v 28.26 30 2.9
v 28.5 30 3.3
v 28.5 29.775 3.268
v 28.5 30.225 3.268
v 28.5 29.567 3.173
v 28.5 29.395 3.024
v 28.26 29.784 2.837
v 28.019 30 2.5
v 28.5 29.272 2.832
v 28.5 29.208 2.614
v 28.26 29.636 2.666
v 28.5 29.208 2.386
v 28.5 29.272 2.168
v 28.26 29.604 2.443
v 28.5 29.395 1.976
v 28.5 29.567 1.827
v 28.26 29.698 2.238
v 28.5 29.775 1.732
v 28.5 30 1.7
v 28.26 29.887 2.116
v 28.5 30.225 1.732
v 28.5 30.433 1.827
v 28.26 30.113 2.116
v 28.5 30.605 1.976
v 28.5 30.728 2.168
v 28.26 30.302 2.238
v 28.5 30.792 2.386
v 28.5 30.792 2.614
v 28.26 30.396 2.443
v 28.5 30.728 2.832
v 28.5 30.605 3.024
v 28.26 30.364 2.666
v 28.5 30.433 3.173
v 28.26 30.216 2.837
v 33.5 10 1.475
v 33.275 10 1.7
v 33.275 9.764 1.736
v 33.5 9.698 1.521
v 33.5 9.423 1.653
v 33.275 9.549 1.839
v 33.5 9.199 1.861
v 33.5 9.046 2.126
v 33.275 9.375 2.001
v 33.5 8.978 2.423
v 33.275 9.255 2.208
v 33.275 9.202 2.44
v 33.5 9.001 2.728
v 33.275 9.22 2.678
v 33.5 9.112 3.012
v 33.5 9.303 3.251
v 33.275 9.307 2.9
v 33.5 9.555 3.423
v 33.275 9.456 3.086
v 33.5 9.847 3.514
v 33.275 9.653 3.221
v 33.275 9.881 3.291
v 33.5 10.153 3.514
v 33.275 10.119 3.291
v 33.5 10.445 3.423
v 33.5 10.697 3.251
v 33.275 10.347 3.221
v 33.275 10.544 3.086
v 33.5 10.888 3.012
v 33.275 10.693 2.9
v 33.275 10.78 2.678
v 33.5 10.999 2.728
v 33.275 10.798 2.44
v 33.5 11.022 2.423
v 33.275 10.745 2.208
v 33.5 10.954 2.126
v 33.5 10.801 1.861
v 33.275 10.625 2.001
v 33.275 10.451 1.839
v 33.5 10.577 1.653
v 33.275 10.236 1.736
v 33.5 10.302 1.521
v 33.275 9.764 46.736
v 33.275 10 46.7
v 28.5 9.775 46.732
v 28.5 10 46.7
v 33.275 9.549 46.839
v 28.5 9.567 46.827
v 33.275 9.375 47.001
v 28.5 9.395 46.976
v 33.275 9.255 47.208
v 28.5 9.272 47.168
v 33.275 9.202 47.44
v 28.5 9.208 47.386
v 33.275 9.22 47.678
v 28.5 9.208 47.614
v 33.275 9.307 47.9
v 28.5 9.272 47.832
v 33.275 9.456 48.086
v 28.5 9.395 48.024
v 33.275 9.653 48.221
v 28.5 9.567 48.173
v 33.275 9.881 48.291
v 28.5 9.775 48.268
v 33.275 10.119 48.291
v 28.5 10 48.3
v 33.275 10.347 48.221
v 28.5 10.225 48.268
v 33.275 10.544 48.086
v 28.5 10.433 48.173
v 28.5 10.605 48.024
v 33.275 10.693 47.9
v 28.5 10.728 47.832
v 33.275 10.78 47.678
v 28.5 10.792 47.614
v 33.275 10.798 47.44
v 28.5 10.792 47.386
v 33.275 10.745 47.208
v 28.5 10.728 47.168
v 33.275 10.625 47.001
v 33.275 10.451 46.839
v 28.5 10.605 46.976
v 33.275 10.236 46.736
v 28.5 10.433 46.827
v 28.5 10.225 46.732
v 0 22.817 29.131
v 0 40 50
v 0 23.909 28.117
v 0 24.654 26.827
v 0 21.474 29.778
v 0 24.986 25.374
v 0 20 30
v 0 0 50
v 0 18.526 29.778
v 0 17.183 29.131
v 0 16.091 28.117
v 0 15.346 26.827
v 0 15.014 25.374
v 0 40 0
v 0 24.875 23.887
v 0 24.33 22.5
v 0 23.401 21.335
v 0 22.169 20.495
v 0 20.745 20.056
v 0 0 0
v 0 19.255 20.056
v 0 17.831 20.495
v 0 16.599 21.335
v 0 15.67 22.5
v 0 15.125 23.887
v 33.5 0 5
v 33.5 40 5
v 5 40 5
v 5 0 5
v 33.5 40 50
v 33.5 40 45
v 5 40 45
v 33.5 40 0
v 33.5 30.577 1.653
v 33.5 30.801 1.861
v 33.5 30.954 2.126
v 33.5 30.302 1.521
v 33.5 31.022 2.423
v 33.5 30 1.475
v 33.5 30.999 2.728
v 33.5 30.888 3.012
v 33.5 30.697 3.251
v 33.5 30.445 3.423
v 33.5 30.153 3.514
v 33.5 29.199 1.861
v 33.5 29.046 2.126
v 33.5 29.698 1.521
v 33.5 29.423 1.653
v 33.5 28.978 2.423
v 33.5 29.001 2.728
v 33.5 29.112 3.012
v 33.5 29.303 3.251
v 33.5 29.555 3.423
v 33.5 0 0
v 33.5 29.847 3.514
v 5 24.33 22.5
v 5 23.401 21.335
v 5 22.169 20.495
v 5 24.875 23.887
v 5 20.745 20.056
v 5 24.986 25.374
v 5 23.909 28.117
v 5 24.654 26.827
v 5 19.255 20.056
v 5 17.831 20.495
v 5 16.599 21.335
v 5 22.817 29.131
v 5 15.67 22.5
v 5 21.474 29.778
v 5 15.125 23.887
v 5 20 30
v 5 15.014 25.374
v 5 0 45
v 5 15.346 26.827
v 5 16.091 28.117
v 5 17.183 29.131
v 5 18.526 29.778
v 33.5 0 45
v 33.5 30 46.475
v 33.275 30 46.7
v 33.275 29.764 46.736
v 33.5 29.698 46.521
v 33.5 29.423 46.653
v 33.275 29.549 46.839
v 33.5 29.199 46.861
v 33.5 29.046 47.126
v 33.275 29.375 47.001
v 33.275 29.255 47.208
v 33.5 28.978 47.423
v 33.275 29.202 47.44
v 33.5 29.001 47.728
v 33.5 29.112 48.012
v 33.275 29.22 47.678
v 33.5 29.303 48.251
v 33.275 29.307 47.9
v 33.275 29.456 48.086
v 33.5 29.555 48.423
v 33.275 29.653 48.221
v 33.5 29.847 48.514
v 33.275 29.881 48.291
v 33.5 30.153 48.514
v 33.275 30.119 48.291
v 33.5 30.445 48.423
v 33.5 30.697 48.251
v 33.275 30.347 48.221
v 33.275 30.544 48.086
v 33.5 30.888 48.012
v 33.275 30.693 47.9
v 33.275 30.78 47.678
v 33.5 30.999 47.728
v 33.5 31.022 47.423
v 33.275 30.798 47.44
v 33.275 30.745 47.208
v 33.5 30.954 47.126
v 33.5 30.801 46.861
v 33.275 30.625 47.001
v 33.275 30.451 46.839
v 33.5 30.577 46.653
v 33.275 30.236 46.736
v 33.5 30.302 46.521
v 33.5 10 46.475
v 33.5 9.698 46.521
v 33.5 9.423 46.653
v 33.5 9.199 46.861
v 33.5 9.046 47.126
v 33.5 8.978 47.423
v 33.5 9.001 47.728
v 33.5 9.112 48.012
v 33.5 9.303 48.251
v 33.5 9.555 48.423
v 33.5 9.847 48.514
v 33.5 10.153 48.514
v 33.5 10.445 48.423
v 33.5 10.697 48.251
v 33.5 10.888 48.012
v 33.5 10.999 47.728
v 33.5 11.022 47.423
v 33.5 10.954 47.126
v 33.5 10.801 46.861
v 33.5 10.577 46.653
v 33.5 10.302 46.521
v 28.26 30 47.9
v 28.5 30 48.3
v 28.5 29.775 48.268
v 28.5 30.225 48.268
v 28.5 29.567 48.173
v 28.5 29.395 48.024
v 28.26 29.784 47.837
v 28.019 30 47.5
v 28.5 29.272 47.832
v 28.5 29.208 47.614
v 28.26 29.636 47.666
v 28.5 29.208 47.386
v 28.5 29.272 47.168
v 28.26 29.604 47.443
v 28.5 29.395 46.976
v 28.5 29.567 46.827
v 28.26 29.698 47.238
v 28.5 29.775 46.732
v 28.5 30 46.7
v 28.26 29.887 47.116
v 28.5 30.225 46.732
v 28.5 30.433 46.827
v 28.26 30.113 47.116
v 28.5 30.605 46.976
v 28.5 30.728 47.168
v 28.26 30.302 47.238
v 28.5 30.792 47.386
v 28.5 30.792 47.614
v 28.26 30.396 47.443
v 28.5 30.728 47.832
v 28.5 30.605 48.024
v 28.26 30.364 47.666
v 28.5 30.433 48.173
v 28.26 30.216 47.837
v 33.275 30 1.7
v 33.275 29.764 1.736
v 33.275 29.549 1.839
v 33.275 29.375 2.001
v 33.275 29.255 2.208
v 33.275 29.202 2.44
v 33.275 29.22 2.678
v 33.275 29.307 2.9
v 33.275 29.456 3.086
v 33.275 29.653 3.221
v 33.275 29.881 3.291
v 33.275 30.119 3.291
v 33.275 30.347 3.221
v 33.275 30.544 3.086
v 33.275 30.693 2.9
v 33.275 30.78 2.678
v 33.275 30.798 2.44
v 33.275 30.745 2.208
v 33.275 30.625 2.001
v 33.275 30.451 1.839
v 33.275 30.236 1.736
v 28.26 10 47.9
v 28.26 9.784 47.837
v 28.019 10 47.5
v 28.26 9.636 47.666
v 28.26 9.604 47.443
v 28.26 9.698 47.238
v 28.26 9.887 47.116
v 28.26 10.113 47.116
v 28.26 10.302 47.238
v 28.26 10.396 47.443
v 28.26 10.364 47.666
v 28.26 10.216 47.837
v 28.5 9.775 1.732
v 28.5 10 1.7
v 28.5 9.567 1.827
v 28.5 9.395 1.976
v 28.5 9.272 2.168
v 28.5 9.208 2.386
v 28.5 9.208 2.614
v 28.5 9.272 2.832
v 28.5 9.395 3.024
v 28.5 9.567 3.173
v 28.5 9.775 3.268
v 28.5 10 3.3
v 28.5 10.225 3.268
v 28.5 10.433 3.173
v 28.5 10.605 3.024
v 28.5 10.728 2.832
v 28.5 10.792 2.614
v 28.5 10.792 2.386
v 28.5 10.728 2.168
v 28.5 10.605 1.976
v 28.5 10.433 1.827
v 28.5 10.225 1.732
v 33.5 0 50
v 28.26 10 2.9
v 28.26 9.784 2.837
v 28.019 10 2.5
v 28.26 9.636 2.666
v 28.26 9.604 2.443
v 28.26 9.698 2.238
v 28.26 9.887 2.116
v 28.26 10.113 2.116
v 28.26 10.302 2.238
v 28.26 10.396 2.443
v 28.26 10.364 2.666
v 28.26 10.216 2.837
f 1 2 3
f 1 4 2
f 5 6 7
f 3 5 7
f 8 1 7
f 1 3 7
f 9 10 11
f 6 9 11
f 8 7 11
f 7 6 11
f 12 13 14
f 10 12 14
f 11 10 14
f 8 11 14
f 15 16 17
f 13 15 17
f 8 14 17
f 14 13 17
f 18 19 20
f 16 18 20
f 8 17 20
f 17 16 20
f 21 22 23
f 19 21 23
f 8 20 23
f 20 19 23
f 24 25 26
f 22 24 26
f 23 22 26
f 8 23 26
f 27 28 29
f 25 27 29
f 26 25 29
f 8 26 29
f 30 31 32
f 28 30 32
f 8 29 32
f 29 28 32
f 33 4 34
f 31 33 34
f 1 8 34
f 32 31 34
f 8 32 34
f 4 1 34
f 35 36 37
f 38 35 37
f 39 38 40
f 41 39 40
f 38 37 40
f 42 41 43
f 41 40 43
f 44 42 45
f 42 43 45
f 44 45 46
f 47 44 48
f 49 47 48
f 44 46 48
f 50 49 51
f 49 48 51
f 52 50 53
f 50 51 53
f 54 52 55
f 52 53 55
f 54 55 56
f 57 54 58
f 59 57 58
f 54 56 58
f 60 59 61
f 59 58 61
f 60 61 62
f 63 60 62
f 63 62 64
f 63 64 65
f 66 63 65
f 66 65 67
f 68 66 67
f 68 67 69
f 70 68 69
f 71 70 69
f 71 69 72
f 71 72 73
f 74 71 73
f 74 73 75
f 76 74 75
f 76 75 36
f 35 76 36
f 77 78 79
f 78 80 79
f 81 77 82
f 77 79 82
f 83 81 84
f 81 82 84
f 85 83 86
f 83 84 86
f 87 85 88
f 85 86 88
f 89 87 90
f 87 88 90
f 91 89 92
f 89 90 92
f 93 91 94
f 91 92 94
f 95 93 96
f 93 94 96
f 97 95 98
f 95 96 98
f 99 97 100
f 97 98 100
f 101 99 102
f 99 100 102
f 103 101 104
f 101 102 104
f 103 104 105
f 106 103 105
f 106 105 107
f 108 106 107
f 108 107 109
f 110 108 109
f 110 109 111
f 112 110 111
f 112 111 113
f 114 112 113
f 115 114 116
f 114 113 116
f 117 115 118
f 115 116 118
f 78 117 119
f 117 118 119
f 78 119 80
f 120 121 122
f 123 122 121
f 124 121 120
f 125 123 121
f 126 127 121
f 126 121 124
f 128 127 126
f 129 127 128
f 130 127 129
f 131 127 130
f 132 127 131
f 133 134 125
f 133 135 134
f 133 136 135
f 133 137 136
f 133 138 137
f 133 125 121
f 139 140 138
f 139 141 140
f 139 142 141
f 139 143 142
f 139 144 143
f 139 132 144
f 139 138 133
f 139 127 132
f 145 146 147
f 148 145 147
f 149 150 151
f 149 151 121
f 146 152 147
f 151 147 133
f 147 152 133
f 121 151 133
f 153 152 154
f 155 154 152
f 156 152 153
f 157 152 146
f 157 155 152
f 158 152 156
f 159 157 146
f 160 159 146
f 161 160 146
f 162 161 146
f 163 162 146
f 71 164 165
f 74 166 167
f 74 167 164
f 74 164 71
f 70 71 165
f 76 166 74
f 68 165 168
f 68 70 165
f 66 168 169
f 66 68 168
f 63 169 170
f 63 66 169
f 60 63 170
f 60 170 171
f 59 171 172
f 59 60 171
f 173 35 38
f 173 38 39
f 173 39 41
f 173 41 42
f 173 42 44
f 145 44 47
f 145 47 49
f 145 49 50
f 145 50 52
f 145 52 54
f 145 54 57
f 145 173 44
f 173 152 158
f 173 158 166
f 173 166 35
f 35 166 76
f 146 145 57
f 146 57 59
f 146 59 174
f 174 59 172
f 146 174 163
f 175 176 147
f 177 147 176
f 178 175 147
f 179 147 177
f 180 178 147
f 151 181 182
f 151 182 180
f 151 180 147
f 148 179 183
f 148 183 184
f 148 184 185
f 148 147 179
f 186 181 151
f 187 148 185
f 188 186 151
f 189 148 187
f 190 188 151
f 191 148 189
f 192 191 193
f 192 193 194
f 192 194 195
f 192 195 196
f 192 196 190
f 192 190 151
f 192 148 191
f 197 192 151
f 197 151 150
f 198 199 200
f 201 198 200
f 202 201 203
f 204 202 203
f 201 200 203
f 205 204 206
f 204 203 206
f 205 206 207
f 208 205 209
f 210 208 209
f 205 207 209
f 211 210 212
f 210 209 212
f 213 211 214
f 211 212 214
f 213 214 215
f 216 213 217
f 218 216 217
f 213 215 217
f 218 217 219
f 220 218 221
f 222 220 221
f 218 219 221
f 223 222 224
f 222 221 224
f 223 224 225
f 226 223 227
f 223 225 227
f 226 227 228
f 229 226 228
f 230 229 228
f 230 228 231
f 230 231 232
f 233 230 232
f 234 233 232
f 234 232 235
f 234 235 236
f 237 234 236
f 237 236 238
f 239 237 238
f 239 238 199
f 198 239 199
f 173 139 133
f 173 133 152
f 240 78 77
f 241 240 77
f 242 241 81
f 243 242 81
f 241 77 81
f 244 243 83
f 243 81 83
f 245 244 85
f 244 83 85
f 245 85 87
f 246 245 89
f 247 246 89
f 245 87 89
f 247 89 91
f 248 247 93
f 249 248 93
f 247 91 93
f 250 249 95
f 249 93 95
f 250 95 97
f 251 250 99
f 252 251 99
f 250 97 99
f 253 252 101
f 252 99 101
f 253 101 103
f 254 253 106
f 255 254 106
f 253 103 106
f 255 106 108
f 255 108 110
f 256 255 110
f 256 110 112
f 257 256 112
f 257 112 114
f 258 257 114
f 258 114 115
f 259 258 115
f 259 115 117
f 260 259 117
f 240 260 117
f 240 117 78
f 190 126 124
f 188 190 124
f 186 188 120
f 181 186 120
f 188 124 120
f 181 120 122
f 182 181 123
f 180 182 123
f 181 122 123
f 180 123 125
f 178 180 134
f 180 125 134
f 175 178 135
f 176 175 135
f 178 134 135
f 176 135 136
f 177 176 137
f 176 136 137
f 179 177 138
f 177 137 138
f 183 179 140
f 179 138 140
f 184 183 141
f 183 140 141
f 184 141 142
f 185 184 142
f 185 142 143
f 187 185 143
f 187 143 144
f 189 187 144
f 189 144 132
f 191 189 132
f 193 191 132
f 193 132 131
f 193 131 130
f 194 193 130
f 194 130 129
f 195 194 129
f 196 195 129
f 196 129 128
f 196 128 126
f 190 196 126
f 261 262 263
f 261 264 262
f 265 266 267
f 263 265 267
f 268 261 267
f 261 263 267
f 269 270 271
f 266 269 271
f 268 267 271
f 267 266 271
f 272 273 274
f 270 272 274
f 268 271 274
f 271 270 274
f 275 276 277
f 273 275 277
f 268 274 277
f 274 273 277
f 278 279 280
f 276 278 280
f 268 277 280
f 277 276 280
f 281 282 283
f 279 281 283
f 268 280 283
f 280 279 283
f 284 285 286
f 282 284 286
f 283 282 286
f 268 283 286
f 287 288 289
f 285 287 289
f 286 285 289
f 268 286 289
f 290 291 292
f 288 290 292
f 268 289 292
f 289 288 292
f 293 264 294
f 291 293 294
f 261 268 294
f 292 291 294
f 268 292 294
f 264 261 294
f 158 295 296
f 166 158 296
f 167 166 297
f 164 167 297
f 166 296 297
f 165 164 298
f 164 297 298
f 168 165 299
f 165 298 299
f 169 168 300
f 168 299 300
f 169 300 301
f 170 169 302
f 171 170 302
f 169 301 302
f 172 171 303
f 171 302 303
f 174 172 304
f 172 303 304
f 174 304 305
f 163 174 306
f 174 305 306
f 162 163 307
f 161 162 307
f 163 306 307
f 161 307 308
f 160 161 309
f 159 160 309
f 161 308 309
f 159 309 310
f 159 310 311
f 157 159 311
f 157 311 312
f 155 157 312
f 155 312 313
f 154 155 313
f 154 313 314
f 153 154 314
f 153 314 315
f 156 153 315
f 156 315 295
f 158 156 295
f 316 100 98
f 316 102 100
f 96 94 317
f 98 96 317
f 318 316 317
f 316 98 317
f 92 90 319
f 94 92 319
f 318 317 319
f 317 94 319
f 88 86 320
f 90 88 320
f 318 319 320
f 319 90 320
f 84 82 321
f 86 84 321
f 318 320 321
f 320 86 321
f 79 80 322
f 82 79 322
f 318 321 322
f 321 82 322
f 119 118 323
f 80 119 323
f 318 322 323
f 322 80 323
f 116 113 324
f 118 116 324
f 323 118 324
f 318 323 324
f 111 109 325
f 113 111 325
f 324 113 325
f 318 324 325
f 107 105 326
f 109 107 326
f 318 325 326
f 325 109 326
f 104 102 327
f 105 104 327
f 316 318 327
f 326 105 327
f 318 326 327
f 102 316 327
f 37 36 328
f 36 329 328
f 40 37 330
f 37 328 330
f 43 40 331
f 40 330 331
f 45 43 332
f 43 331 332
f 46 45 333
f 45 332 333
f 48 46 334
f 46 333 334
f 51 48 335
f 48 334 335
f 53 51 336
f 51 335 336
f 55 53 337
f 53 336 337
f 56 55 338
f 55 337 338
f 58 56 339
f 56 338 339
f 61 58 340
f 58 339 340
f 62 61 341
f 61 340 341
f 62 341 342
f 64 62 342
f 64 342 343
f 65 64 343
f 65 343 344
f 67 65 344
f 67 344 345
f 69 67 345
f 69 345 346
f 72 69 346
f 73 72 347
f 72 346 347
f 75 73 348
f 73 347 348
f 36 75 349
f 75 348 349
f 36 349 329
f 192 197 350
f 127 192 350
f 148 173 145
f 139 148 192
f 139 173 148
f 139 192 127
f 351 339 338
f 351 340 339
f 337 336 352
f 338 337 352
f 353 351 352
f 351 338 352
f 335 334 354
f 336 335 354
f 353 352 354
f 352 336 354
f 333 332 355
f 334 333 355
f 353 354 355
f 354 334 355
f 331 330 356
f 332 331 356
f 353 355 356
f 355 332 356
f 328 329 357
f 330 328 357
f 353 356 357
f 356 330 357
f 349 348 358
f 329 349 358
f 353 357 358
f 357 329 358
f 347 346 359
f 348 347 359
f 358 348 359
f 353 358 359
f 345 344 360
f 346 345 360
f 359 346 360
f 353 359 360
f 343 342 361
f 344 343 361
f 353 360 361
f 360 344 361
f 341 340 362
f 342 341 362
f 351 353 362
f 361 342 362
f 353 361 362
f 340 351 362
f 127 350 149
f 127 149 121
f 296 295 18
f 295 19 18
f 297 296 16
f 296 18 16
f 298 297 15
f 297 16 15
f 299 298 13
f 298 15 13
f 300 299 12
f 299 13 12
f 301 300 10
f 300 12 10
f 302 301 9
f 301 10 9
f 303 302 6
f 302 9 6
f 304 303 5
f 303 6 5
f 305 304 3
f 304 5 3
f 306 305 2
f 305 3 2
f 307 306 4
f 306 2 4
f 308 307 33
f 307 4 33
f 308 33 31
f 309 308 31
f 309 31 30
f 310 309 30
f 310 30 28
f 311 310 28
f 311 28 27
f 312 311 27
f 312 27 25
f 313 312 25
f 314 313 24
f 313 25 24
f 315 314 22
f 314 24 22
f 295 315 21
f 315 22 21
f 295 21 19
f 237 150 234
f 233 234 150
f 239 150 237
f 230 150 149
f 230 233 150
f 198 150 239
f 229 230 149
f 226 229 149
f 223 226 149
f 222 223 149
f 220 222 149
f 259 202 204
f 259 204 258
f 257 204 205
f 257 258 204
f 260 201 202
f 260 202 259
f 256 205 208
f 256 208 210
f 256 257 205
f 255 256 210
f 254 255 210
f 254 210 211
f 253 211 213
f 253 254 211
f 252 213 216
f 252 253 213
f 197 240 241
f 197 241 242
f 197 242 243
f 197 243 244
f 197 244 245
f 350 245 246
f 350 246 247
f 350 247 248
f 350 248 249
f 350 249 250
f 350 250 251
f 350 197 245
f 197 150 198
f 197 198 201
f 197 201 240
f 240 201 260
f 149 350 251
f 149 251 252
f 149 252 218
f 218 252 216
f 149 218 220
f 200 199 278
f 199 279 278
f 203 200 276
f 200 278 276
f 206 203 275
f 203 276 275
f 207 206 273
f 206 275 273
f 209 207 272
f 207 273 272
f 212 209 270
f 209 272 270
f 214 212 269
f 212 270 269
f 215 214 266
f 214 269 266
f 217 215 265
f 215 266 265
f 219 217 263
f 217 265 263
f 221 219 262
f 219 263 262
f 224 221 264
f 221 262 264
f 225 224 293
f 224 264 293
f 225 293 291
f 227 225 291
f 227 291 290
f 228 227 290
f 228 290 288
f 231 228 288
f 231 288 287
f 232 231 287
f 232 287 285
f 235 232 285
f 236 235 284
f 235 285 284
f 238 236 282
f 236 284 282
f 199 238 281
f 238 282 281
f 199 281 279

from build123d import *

# Parameters (mm, degrees)
BOSS_EXTRUDE1_DEPTH         = 40
CUT_EXTRUDE1_REACH          = 74.265
SKETCH2_R                   = 5
M2_TAPPED_HOLE2_D           = 1.6
M2_TAPPED_HOLE2_DEPTH       = 5
M2_TAPPED_HOLE2_CSINK_D     = 2.05
M2_TAPPED_HOLE2_CSINK_ANGLE = 90
M2_TAPPED_HOLE2_TIP         = 0.480688495


with BuildPart() as part:
    # Sketch1 → Boss-Extrude1 (new body)
    with BuildSketch(Plane(origin=(0, 0, 0), x_dir=(1, 0, 0), z_dir=(0, 1, 0))):
        Polygon((33.5, 0), (33.5, -5), (5, -5), (5, -45), (33.5, -45), (33.5, -50), (0, -50), (0, 0), align=None)
    extrude(amount=BOSS_EXTRUDE1_DEPTH)

    # Sketch2 → Cut-Extrude1 (cut, up to next)
    with BuildSketch(Plane.ZY, mode=Mode.PRIVATE) as cut_extrude1_sk1:
        with Locations((25, 20)):
            Circle(SKETCH2_R)
    cut_extrude1_tool1 = extrude(cut_extrude1_sk1.sketch, amount=-CUT_EXTRUDE1_REACH, mode=Mode.PRIVATE) & part.part
    add(cut_extrude1_tool1.solids().sort_by_distance((0, 20, 25))[0], mode=Mode.SUBTRACT)

    # M2 Tapped Hole2
    with Locations(Plane(origin=(33.5, 30, 47.5), x_dir=(0, 0, 1), z_dir=(1, 0, 0))):
        with Locations((0, 0), (0, 20), (-45, 20), (-45, 0)):
            CounterSinkHole(M2_TAPPED_HOLE2_D / 2, M2_TAPPED_HOLE2_CSINK_D / 2, depth=M2_TAPPED_HOLE2_DEPTH, counter_sink_angle=M2_TAPPED_HOLE2_CSINK_ANGLE)
            with Locations((0, 0, -(M2_TAPPED_HOLE2_DEPTH + M2_TAPPED_HOLE2_TIP / 2))):  # 118° drill point
                Cone(0, M2_TAPPED_HOLE2_D / 2, M2_TAPPED_HOLE2_TIP, mode=Mode.SUBTRACT)


solid = part.part
